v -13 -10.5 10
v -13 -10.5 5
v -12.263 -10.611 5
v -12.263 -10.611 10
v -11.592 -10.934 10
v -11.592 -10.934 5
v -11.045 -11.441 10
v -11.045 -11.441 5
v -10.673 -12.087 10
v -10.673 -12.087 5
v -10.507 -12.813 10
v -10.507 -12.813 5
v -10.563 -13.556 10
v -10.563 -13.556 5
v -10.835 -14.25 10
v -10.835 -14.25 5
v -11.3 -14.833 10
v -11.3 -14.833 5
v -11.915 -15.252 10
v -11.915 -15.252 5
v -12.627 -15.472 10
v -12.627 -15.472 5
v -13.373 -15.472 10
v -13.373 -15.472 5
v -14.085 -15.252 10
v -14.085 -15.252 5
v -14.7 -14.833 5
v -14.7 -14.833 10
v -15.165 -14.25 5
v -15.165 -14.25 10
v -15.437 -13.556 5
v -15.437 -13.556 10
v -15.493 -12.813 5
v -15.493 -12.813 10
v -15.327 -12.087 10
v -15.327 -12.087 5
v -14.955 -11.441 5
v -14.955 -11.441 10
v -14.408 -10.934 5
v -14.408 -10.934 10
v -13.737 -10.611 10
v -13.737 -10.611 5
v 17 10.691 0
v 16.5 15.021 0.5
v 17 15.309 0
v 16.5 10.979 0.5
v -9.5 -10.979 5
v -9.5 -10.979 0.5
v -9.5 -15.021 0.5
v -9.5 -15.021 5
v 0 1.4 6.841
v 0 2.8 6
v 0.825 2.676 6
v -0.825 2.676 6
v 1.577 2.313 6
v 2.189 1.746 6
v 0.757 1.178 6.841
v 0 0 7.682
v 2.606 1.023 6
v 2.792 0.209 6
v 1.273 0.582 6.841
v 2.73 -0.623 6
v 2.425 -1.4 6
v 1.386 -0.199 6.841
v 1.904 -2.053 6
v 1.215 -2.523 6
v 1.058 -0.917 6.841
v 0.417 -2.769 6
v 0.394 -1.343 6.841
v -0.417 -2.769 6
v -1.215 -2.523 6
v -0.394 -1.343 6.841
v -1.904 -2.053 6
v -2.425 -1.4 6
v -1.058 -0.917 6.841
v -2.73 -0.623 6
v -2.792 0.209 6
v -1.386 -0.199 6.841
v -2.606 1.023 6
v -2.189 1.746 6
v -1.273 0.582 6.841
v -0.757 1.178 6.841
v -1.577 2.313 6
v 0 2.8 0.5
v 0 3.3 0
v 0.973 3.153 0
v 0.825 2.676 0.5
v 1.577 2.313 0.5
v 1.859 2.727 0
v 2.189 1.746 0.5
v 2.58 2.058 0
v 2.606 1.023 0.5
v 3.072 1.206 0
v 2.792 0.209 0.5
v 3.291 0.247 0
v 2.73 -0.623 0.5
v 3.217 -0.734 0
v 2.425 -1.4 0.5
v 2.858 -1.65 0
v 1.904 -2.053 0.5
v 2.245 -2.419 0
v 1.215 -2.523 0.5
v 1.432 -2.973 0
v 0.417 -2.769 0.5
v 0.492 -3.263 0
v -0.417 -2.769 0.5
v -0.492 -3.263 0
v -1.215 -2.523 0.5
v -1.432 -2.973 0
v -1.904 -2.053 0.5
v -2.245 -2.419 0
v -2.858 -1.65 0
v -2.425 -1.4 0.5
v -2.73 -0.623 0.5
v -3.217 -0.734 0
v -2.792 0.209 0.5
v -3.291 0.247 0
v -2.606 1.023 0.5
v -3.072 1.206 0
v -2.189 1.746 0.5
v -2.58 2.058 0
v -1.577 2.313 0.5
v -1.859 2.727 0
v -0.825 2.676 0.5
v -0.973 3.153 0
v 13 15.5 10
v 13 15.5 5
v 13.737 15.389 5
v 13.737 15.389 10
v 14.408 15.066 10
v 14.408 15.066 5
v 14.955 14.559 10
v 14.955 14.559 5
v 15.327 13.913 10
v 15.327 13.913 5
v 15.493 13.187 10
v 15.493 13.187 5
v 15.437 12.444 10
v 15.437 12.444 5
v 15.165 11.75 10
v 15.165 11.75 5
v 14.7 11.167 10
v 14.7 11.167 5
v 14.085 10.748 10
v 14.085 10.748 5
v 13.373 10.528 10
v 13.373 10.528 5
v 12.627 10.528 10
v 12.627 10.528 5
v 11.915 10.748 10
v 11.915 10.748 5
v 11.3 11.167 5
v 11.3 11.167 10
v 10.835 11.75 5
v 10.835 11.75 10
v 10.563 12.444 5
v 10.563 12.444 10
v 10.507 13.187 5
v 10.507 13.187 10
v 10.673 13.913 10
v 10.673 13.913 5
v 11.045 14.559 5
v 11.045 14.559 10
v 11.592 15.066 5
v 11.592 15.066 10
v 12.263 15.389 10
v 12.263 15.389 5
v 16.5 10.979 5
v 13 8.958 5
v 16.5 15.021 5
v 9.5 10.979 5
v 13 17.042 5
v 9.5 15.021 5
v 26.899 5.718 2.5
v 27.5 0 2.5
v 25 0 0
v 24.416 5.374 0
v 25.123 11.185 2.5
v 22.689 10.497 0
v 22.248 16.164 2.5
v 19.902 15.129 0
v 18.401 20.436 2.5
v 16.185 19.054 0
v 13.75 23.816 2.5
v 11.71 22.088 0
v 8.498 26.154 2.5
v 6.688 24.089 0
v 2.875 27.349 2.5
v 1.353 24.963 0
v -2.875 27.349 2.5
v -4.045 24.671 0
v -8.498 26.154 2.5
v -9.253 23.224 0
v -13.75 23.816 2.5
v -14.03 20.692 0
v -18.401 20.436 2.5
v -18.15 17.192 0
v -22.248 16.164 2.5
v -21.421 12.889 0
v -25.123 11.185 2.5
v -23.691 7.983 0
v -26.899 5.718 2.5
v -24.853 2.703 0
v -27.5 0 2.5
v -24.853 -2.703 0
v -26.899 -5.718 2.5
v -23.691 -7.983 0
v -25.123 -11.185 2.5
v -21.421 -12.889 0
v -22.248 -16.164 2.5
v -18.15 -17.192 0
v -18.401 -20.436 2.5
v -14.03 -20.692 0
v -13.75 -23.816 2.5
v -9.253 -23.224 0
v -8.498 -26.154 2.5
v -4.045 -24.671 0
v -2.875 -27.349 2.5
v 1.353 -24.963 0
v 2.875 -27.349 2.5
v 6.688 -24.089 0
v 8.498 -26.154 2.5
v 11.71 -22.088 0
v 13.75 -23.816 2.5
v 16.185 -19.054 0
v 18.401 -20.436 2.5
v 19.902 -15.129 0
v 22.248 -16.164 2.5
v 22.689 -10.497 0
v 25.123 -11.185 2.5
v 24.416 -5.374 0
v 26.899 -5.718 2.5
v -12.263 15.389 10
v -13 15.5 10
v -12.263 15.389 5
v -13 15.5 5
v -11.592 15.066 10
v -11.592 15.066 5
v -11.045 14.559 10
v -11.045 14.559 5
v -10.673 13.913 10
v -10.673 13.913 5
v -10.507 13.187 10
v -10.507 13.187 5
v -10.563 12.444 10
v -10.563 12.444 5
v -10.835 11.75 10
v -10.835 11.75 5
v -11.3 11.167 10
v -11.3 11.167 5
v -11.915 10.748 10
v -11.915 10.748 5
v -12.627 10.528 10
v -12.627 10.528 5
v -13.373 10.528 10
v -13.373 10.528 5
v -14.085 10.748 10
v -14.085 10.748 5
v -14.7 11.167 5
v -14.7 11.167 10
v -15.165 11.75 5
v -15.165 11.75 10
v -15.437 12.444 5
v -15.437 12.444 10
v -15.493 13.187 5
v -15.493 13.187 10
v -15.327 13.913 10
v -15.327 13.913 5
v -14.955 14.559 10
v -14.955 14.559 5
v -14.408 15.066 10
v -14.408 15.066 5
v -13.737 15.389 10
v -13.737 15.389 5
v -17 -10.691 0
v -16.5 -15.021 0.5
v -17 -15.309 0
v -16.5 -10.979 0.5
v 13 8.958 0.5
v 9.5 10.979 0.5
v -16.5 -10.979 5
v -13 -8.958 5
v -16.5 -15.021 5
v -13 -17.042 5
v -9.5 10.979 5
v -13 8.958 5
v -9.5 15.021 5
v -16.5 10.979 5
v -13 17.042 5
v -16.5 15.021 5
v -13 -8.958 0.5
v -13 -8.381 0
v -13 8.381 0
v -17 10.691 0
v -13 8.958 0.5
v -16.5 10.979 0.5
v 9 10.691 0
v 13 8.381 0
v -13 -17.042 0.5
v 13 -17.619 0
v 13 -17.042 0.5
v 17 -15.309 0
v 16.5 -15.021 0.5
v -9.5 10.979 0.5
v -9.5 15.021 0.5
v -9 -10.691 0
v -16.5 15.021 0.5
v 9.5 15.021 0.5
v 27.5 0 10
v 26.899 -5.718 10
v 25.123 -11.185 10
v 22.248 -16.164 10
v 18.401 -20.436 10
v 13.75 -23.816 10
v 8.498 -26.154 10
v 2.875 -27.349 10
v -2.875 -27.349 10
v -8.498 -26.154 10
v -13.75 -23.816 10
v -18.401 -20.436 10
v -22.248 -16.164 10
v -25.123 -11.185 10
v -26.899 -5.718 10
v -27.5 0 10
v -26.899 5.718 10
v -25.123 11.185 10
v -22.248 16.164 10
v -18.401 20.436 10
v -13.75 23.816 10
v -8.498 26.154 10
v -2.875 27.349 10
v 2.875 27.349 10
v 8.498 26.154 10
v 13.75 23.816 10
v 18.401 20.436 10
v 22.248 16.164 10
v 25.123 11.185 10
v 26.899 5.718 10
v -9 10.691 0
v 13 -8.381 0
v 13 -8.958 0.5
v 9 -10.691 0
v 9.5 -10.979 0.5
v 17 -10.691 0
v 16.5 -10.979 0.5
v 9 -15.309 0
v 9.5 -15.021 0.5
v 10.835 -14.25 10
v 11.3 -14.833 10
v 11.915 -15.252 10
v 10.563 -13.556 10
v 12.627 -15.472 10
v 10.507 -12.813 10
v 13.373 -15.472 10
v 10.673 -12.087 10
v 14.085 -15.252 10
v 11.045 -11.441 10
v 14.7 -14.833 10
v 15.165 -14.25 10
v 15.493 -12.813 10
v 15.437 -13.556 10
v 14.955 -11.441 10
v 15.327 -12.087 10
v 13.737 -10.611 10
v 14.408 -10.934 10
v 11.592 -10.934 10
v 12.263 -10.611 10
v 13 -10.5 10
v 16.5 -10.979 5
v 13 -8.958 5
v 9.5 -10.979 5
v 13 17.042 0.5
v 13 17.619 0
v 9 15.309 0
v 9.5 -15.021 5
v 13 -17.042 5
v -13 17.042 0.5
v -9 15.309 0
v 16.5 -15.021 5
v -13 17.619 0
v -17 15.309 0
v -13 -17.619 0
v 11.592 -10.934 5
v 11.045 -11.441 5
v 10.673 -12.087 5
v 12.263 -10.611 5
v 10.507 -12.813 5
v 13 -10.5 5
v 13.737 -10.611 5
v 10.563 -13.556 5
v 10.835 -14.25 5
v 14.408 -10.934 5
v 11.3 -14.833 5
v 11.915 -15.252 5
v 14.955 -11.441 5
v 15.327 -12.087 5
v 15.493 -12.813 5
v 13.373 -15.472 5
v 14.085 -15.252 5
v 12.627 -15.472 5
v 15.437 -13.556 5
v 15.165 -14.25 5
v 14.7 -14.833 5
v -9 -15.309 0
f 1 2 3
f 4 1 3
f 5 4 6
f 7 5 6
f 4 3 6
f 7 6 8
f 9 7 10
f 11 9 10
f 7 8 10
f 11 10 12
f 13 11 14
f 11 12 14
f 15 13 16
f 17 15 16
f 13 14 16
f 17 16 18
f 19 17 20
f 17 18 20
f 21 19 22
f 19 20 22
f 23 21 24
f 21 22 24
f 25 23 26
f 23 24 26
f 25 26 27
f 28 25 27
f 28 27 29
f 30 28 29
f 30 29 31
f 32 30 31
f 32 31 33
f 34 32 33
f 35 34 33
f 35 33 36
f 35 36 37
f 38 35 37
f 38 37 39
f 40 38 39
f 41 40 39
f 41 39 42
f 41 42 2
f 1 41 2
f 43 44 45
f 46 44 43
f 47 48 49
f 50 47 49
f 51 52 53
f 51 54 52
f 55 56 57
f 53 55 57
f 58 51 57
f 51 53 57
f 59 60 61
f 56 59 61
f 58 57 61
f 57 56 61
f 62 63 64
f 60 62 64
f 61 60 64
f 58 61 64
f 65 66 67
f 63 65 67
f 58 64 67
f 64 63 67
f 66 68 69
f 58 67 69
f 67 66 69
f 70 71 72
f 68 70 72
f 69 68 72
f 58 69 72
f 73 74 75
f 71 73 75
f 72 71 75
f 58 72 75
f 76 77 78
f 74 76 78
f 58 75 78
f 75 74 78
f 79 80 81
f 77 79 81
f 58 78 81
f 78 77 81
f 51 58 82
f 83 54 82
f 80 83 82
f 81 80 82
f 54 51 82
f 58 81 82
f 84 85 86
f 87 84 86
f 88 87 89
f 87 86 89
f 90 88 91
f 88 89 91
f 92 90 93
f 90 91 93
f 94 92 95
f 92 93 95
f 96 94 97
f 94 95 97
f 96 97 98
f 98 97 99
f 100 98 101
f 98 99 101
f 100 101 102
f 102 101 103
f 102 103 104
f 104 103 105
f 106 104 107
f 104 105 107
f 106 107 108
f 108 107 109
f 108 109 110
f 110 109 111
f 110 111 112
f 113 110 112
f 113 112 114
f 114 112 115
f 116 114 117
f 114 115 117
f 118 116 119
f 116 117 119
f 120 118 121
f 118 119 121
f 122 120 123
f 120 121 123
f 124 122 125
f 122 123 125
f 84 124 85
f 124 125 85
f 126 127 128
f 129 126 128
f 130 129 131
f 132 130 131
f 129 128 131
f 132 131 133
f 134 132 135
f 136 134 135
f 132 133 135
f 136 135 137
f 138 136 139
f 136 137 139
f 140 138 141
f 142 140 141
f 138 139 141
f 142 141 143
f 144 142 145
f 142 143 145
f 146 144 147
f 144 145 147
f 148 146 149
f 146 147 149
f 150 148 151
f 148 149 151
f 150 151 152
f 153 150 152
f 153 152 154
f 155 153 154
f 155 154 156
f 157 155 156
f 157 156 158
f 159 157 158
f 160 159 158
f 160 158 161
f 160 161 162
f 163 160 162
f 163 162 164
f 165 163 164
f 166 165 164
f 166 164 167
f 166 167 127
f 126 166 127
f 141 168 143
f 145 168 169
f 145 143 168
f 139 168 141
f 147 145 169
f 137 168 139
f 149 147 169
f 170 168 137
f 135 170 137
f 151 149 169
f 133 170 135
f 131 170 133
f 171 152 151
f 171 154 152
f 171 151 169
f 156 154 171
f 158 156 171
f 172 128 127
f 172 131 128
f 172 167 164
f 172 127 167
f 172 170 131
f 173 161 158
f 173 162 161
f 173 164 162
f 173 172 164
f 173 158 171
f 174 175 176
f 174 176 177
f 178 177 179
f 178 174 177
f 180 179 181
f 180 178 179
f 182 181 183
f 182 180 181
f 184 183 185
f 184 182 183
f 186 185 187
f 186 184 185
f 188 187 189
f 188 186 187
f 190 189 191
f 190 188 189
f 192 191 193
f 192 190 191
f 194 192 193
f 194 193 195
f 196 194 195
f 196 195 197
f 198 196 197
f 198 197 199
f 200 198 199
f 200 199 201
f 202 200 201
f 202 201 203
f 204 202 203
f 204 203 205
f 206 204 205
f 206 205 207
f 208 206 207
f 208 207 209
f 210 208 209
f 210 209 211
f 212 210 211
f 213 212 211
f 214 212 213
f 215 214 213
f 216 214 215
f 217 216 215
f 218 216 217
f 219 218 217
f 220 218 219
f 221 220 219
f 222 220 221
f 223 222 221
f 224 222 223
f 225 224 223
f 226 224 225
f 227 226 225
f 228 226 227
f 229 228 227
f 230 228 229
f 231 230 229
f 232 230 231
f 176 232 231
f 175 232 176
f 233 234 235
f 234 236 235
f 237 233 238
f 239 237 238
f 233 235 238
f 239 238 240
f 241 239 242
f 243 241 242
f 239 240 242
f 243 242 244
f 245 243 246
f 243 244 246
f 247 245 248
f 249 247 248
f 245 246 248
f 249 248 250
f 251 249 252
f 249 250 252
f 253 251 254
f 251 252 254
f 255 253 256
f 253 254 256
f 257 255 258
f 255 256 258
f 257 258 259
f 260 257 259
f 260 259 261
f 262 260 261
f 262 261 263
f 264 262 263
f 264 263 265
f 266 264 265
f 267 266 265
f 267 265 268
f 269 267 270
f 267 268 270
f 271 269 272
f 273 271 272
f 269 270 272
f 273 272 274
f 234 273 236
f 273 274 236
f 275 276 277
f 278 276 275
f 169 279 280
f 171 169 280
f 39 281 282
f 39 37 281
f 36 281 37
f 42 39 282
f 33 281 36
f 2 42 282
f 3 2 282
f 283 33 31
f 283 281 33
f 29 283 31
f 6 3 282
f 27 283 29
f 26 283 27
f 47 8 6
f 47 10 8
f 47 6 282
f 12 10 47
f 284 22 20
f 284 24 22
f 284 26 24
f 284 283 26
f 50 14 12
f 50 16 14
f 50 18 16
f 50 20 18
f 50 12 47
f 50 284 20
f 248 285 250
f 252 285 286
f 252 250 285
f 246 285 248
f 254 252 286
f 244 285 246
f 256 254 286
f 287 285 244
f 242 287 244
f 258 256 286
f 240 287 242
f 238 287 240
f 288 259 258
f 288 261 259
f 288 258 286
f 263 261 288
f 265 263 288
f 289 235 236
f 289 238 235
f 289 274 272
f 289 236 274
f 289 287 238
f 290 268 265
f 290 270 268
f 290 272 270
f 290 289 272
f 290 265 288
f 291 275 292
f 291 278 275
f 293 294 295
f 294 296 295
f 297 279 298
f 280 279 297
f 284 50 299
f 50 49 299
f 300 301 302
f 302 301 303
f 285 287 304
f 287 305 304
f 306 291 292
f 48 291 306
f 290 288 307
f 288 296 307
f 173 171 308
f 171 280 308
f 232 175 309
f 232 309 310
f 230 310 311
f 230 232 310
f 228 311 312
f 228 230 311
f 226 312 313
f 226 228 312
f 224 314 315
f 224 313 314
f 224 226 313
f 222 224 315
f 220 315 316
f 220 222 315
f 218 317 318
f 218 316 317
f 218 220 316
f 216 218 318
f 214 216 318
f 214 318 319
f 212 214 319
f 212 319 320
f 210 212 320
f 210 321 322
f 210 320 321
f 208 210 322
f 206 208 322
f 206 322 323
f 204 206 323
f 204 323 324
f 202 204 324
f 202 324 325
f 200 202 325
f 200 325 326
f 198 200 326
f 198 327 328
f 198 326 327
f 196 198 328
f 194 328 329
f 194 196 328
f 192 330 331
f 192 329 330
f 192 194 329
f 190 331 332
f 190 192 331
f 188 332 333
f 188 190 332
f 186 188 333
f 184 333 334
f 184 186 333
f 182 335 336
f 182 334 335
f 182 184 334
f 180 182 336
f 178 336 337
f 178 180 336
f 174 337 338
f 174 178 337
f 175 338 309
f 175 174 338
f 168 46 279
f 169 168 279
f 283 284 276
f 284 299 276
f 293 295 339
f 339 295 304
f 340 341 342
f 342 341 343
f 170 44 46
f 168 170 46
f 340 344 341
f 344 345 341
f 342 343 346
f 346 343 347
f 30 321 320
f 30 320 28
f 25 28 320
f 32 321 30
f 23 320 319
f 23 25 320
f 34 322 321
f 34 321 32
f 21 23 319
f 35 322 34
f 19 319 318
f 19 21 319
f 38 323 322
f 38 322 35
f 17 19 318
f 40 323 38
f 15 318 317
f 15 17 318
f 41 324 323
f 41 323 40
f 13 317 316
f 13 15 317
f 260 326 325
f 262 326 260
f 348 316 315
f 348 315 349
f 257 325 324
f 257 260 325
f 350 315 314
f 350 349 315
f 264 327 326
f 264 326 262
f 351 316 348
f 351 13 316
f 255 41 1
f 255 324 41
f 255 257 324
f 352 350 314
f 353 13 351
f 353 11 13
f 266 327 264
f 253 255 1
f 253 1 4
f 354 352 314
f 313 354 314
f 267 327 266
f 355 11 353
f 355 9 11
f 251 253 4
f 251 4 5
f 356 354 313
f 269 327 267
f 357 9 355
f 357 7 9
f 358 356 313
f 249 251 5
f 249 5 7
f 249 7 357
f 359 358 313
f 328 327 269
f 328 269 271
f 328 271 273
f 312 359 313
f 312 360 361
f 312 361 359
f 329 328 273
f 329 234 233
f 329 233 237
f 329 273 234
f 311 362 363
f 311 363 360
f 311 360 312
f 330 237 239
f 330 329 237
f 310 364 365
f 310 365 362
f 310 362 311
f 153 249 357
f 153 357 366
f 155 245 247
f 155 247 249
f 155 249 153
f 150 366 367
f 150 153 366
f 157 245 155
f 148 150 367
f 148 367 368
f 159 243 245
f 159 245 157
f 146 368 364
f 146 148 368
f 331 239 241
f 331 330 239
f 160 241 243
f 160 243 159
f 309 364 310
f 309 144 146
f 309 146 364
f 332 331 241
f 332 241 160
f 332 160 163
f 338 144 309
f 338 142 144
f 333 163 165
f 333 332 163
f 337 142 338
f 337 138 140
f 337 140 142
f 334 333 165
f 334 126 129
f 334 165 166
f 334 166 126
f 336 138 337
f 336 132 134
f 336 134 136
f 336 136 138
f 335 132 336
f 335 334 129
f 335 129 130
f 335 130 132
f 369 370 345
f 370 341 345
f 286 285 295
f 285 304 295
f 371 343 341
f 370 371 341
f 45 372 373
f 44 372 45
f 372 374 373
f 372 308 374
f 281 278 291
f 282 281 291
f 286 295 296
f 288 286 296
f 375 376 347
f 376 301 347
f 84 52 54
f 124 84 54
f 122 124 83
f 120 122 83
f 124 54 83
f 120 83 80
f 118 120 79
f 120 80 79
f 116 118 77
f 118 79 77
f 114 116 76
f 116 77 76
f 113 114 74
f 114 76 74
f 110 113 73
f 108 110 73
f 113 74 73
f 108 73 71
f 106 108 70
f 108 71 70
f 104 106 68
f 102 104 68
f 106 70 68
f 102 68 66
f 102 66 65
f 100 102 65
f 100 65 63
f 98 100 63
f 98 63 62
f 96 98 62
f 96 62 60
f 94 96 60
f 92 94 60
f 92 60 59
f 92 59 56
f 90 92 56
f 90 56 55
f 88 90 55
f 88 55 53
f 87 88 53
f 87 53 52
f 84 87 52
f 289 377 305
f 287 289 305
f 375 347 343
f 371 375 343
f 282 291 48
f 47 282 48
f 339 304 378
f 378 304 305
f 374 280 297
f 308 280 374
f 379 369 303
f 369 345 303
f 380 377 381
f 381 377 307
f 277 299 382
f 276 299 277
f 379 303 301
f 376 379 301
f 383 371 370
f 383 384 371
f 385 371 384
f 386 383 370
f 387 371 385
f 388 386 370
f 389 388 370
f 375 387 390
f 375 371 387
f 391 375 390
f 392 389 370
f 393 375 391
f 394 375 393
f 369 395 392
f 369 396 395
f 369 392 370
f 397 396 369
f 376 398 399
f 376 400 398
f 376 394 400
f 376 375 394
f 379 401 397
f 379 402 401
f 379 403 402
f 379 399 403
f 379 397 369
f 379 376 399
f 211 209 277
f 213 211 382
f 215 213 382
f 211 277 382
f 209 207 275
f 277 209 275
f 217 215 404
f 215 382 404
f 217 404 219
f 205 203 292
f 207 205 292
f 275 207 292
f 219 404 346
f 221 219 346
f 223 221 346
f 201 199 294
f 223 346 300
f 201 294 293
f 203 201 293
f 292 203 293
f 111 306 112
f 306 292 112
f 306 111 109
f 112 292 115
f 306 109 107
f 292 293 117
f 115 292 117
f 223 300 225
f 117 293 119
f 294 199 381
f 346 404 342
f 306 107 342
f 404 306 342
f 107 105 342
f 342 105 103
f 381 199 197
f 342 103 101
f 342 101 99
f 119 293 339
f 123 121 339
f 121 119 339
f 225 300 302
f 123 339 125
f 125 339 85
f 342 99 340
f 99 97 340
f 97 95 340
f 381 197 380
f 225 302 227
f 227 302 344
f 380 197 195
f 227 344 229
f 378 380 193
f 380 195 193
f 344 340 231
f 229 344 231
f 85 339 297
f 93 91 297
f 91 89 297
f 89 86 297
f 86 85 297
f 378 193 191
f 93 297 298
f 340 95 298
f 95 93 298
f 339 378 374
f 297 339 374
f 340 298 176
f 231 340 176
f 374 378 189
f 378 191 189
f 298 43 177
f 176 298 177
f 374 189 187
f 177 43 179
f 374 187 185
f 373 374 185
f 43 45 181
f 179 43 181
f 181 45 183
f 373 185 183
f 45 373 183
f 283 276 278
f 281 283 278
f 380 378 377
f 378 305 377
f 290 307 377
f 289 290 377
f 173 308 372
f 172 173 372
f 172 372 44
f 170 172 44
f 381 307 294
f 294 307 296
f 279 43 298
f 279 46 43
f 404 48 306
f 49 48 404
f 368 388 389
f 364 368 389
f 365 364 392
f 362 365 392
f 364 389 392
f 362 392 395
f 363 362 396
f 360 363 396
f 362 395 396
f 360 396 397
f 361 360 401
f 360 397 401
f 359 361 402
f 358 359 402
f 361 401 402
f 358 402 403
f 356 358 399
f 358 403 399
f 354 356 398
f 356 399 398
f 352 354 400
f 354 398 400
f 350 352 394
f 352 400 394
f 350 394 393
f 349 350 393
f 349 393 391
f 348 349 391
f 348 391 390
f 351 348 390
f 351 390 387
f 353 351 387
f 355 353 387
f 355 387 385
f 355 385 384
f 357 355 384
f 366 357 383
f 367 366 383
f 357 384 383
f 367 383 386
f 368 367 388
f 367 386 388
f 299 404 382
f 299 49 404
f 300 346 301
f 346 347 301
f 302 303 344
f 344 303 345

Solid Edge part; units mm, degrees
sketch "Sketch1" plane through (0, 0, 0) normal (0, -1, 0) x (1, 0, 0)
  line L0 (0, 10) -> (27.5, 10)
  line L1 (27.5, 10) -> (27.5, 0)
  line L2 (27.5, 0) -> (0, 0)
  dimension "D1" = 10
revolve "RevolvedProtrusion1" add sketch "Sketch1" angle 360 about axis through (0, 0, 0) along (0, 0, 1)
chamfer "Chamfer1" distance 2.5 angle 45 1 edges at (-27.5, 0, 0)
hole "Hole_1" at (-13, 13, 0) direction (0, 0, 1) diameter 5 end up to next
hole "Hole1" at (-13, -13, 0) direction (0, 0, 1) diameter 5 end up to next
hole "Hole2" at (13, 13, 0) direction (0, 0, 1) diameter 5 end up to next
hole "Hole3" at (13, -13, 0) direction (0, 0, 1) diameter 5 end up to next
hole "Hole_5" at (0, 0, 0) direction (0, 0, 1) diameter 5.6 depth 6 tip angle 118
chamfer "Chamfer_2" distance 0.5 angle 45 1 edges at (0, -2.8, 0)
sketch "Sketch2" plane through (0, 0, 0) normal (0, 0, -1) x (-1, 0, 0)
  line L0 (-16.5, 15.0207) -> (-16.5, 10.9793)
  line L1 (-16.5, 10.9793) -> (-13, 8.9585)
  line L2 (-13, 8.9585) -> (-9.5, 10.9793)
  line L3 (-9.5, 10.9793) -> (-9.5, 15.0207)
  line L4 (-9.5, 15.0207) -> (-13, 17.0415)
  line L5 (-13, 17.0415) -> (-16.5, 15.0207)
  dimension "D1" = 7
extrude "ExtrudedCutout_1" cut sketch "Sketch2" against normal blind 5
chamfer "Chamfer_3" distance 0.5 angle 45 6 edges at (14.75, 16.0311, 0) (11.25, 16.0311, 0) (9.5, 13, 0) (11.25, 9.9689, 0) (14.75, 9.9689, 0) (16.5, 13, 0)
mirror "Mirror1" about plane through (0, 0, 0) normal (1, 0, 0) of "ExtrudedCutout_1"
chamfer "Chamfer2" distance 0.5 angle 45 6 edges at (-14.75, 16.0311, 0) (-11.25, 16.0311, 0) (-9.5, 13, 0) (-11.25, 9.9689, 0) (-14.75, 9.9689, 0) (-16.5, 13, 0)
mirror "Mirror2" about plane through (0, 0, 0) normal (0, -1, 0) of "ExtrudedCutout_1", "Mirror1"
chamfer "Chamfer3" distance 0.5 angle 45 6 edges at (14.75, -16.0311, 0) (11.25, -16.0311, 0) (9.5, -13, 0) (11.25, -9.9689, 0) (14.75, -9.9689, 0) (16.5, -13, 0)
chamfer "Chamfer4" distance 0.5 angle 45 6 edges at (-14.75, -16.0311, 0) (-11.25, -16.0311, 0) (-9.5, -13, 0) (-11.25, -9.9689, 0) (-14.75, -9.9689, 0) (-16.5, -13, 0)
properties material "Polyethylene, low density"
